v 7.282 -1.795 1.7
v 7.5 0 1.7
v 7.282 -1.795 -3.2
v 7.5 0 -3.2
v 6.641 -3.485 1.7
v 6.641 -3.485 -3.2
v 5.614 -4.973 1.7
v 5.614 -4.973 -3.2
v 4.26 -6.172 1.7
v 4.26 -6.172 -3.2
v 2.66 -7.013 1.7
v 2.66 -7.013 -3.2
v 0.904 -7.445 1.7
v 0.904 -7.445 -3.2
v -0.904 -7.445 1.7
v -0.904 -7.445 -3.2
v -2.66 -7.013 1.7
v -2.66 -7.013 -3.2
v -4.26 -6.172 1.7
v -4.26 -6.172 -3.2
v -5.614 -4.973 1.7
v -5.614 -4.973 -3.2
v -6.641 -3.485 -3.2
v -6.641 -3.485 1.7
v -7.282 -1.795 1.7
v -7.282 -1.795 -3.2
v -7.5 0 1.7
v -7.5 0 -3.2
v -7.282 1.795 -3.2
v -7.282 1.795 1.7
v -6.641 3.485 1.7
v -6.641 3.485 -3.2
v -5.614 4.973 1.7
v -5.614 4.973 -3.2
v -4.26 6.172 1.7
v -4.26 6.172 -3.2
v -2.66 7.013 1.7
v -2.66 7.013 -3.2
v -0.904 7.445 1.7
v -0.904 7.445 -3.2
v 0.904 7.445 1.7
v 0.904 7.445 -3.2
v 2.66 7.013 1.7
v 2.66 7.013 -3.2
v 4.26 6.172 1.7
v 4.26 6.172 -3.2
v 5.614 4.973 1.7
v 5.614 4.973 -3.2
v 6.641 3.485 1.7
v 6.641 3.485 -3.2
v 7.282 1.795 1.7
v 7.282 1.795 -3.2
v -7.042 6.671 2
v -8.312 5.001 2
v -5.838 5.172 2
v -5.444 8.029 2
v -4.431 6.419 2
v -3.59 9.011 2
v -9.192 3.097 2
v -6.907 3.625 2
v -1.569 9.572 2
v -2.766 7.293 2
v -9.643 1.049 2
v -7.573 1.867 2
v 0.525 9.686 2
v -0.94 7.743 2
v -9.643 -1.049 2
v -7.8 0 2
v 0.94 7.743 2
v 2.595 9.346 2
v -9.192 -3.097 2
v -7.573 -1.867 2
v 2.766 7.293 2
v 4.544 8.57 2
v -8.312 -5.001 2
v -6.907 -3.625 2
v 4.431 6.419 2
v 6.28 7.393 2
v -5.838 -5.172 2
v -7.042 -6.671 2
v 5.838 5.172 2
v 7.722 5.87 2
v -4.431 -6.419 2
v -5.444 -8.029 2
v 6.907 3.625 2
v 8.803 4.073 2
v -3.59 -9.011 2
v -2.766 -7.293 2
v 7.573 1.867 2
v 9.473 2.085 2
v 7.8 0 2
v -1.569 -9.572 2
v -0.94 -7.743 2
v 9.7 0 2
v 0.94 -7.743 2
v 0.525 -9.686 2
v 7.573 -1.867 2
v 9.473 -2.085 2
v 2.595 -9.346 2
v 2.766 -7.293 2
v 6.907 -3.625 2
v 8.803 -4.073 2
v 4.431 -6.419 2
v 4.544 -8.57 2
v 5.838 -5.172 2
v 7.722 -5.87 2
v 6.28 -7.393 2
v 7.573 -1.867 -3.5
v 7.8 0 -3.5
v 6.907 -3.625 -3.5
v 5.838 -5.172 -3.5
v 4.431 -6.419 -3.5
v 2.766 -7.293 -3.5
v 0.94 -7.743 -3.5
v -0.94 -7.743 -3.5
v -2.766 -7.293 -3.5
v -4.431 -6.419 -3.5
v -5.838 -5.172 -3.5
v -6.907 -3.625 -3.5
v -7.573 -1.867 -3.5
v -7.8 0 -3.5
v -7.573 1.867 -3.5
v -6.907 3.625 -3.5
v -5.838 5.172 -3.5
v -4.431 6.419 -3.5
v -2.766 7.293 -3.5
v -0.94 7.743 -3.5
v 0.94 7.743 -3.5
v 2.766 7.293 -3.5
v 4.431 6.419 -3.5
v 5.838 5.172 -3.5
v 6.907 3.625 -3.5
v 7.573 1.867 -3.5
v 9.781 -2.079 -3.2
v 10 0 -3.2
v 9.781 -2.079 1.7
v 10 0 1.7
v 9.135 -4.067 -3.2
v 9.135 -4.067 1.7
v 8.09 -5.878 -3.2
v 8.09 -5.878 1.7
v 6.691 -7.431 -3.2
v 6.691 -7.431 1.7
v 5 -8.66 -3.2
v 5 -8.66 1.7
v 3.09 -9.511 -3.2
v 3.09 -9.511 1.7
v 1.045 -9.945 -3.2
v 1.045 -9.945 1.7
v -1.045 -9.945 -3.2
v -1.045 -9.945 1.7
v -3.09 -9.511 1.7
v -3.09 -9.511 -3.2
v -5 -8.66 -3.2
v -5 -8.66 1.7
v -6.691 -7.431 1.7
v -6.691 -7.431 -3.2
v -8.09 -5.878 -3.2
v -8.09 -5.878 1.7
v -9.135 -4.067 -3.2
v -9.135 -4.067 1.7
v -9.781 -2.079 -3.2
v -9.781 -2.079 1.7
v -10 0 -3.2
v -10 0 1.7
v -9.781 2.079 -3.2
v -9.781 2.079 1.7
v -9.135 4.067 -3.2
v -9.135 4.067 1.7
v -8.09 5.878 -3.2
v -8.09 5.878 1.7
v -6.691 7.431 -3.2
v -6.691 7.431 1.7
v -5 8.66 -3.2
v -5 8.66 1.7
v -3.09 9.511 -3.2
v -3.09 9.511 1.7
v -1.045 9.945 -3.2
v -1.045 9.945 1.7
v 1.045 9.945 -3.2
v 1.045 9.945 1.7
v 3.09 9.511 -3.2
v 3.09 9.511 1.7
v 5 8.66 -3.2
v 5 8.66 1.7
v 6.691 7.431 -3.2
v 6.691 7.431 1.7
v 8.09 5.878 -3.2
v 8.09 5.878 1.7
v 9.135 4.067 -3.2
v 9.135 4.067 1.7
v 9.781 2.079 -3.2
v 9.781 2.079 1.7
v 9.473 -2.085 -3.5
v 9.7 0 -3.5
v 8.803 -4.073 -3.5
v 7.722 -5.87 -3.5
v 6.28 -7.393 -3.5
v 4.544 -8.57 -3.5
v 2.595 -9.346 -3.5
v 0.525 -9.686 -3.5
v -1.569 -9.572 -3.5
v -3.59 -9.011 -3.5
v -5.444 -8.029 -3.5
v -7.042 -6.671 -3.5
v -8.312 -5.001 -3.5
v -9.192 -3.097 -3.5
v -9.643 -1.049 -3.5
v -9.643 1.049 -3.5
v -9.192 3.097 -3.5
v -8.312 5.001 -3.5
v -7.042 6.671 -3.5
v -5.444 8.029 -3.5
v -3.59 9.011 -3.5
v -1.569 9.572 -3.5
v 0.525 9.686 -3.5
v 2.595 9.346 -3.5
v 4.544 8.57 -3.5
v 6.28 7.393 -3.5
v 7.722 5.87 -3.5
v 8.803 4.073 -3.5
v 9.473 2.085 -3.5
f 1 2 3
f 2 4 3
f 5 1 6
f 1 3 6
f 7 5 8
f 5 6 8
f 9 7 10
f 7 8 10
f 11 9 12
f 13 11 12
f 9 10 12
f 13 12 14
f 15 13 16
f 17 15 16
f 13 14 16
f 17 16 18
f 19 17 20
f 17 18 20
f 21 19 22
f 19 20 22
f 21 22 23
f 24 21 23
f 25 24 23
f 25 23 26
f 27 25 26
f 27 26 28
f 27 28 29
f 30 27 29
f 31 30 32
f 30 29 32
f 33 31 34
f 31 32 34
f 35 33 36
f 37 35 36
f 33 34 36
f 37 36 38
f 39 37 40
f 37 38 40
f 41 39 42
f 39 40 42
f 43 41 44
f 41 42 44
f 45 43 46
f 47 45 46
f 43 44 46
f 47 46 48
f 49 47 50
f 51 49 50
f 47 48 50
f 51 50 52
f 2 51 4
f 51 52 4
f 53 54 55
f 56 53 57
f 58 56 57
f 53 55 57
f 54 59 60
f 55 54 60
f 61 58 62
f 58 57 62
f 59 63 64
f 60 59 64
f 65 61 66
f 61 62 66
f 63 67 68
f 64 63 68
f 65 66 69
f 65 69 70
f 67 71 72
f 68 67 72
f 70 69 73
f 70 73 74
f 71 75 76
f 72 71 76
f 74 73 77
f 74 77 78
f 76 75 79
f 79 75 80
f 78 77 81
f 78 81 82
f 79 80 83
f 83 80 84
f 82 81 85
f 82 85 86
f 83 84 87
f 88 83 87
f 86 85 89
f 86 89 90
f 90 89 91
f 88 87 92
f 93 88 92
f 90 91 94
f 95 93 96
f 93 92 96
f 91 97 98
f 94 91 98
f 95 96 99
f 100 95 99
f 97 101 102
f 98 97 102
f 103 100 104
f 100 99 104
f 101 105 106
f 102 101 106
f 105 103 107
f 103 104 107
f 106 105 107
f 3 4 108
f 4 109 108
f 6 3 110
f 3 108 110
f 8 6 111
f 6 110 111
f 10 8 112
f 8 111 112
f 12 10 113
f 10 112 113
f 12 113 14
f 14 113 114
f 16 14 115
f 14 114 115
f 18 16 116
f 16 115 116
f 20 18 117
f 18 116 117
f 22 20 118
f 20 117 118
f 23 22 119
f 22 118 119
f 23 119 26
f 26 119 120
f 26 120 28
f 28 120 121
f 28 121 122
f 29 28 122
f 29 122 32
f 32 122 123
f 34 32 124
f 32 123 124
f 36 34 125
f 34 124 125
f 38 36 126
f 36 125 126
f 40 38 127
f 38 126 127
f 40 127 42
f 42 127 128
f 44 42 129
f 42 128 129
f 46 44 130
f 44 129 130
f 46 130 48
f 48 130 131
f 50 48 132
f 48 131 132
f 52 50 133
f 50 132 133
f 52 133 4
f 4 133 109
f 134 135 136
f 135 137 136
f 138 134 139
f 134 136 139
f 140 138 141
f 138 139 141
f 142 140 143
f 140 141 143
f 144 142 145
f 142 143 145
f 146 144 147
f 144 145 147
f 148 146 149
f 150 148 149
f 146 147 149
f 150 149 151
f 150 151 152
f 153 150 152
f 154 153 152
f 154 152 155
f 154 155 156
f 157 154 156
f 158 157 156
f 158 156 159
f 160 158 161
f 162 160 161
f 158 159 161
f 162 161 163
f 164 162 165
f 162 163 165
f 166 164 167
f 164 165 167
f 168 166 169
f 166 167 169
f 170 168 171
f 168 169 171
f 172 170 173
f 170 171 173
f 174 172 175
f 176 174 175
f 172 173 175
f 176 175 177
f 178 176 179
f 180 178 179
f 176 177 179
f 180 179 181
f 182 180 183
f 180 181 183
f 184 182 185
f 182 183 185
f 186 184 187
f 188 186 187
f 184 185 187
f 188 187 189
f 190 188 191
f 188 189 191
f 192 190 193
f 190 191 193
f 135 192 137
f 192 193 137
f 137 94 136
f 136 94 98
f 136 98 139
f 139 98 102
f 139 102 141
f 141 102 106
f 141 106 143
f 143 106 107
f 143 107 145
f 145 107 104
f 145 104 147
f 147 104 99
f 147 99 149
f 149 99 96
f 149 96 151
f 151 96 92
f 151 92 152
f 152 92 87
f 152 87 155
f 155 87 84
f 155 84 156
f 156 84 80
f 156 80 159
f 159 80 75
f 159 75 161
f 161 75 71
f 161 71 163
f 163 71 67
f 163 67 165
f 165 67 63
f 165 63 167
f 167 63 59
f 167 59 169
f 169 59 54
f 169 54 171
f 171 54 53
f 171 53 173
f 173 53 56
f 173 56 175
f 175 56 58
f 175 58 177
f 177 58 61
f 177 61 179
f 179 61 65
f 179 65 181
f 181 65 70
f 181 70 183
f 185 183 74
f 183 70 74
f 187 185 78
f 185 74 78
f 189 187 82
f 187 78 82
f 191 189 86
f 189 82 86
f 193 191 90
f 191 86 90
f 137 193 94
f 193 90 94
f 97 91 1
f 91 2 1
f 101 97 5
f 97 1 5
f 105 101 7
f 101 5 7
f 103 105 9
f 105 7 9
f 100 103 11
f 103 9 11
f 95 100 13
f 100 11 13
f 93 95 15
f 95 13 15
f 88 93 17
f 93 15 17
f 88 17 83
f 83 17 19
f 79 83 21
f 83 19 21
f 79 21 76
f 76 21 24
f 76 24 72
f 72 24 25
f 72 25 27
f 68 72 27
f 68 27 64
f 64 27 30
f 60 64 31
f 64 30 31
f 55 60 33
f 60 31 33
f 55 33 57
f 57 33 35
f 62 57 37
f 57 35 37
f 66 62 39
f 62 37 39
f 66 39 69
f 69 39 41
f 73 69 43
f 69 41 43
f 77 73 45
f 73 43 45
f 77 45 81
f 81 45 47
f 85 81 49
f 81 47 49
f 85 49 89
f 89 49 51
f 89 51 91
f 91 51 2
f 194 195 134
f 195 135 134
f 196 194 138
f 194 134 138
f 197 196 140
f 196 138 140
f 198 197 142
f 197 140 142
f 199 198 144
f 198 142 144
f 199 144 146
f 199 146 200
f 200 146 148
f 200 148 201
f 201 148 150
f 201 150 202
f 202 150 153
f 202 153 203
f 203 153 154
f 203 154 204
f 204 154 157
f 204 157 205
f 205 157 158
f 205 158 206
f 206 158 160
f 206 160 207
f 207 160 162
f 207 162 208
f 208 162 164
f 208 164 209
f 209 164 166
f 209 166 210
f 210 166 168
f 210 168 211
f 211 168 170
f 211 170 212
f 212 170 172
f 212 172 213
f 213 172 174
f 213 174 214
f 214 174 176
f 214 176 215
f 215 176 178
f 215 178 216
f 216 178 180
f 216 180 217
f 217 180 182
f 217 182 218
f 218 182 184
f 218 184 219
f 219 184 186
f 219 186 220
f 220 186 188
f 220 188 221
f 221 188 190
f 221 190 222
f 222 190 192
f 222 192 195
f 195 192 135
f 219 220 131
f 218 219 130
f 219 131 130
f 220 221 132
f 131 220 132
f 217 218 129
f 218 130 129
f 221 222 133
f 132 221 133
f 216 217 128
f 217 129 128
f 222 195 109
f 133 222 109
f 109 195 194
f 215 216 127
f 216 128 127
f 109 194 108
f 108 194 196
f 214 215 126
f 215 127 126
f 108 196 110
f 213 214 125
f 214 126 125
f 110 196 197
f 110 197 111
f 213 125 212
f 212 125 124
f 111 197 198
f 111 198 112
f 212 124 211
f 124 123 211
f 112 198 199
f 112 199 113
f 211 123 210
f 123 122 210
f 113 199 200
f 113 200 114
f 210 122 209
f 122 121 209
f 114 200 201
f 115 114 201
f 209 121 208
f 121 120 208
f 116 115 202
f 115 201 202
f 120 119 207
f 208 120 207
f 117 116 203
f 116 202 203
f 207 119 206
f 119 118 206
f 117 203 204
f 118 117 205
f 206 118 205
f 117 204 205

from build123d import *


with BuildPart() as part:
    # Esquisse1 → Révolution1 (revolve)
    with BuildSketch(Plane(origin=(0, 0, 0), x_dir=(0, 0, -1), z_dir=(1, 0, 0))):
        Polygon((-1.7, 10), (-2, 9.7), (-2, 7.8), (-1.7, 7.5), (3.2, 7.5), (3.5, 7.8), (3.5, 9.7), (3.2, 10), align=None)
    revolve(axis=Axis((0, 0, 10.3632), (0, 0, -1)))


solid = part.part
